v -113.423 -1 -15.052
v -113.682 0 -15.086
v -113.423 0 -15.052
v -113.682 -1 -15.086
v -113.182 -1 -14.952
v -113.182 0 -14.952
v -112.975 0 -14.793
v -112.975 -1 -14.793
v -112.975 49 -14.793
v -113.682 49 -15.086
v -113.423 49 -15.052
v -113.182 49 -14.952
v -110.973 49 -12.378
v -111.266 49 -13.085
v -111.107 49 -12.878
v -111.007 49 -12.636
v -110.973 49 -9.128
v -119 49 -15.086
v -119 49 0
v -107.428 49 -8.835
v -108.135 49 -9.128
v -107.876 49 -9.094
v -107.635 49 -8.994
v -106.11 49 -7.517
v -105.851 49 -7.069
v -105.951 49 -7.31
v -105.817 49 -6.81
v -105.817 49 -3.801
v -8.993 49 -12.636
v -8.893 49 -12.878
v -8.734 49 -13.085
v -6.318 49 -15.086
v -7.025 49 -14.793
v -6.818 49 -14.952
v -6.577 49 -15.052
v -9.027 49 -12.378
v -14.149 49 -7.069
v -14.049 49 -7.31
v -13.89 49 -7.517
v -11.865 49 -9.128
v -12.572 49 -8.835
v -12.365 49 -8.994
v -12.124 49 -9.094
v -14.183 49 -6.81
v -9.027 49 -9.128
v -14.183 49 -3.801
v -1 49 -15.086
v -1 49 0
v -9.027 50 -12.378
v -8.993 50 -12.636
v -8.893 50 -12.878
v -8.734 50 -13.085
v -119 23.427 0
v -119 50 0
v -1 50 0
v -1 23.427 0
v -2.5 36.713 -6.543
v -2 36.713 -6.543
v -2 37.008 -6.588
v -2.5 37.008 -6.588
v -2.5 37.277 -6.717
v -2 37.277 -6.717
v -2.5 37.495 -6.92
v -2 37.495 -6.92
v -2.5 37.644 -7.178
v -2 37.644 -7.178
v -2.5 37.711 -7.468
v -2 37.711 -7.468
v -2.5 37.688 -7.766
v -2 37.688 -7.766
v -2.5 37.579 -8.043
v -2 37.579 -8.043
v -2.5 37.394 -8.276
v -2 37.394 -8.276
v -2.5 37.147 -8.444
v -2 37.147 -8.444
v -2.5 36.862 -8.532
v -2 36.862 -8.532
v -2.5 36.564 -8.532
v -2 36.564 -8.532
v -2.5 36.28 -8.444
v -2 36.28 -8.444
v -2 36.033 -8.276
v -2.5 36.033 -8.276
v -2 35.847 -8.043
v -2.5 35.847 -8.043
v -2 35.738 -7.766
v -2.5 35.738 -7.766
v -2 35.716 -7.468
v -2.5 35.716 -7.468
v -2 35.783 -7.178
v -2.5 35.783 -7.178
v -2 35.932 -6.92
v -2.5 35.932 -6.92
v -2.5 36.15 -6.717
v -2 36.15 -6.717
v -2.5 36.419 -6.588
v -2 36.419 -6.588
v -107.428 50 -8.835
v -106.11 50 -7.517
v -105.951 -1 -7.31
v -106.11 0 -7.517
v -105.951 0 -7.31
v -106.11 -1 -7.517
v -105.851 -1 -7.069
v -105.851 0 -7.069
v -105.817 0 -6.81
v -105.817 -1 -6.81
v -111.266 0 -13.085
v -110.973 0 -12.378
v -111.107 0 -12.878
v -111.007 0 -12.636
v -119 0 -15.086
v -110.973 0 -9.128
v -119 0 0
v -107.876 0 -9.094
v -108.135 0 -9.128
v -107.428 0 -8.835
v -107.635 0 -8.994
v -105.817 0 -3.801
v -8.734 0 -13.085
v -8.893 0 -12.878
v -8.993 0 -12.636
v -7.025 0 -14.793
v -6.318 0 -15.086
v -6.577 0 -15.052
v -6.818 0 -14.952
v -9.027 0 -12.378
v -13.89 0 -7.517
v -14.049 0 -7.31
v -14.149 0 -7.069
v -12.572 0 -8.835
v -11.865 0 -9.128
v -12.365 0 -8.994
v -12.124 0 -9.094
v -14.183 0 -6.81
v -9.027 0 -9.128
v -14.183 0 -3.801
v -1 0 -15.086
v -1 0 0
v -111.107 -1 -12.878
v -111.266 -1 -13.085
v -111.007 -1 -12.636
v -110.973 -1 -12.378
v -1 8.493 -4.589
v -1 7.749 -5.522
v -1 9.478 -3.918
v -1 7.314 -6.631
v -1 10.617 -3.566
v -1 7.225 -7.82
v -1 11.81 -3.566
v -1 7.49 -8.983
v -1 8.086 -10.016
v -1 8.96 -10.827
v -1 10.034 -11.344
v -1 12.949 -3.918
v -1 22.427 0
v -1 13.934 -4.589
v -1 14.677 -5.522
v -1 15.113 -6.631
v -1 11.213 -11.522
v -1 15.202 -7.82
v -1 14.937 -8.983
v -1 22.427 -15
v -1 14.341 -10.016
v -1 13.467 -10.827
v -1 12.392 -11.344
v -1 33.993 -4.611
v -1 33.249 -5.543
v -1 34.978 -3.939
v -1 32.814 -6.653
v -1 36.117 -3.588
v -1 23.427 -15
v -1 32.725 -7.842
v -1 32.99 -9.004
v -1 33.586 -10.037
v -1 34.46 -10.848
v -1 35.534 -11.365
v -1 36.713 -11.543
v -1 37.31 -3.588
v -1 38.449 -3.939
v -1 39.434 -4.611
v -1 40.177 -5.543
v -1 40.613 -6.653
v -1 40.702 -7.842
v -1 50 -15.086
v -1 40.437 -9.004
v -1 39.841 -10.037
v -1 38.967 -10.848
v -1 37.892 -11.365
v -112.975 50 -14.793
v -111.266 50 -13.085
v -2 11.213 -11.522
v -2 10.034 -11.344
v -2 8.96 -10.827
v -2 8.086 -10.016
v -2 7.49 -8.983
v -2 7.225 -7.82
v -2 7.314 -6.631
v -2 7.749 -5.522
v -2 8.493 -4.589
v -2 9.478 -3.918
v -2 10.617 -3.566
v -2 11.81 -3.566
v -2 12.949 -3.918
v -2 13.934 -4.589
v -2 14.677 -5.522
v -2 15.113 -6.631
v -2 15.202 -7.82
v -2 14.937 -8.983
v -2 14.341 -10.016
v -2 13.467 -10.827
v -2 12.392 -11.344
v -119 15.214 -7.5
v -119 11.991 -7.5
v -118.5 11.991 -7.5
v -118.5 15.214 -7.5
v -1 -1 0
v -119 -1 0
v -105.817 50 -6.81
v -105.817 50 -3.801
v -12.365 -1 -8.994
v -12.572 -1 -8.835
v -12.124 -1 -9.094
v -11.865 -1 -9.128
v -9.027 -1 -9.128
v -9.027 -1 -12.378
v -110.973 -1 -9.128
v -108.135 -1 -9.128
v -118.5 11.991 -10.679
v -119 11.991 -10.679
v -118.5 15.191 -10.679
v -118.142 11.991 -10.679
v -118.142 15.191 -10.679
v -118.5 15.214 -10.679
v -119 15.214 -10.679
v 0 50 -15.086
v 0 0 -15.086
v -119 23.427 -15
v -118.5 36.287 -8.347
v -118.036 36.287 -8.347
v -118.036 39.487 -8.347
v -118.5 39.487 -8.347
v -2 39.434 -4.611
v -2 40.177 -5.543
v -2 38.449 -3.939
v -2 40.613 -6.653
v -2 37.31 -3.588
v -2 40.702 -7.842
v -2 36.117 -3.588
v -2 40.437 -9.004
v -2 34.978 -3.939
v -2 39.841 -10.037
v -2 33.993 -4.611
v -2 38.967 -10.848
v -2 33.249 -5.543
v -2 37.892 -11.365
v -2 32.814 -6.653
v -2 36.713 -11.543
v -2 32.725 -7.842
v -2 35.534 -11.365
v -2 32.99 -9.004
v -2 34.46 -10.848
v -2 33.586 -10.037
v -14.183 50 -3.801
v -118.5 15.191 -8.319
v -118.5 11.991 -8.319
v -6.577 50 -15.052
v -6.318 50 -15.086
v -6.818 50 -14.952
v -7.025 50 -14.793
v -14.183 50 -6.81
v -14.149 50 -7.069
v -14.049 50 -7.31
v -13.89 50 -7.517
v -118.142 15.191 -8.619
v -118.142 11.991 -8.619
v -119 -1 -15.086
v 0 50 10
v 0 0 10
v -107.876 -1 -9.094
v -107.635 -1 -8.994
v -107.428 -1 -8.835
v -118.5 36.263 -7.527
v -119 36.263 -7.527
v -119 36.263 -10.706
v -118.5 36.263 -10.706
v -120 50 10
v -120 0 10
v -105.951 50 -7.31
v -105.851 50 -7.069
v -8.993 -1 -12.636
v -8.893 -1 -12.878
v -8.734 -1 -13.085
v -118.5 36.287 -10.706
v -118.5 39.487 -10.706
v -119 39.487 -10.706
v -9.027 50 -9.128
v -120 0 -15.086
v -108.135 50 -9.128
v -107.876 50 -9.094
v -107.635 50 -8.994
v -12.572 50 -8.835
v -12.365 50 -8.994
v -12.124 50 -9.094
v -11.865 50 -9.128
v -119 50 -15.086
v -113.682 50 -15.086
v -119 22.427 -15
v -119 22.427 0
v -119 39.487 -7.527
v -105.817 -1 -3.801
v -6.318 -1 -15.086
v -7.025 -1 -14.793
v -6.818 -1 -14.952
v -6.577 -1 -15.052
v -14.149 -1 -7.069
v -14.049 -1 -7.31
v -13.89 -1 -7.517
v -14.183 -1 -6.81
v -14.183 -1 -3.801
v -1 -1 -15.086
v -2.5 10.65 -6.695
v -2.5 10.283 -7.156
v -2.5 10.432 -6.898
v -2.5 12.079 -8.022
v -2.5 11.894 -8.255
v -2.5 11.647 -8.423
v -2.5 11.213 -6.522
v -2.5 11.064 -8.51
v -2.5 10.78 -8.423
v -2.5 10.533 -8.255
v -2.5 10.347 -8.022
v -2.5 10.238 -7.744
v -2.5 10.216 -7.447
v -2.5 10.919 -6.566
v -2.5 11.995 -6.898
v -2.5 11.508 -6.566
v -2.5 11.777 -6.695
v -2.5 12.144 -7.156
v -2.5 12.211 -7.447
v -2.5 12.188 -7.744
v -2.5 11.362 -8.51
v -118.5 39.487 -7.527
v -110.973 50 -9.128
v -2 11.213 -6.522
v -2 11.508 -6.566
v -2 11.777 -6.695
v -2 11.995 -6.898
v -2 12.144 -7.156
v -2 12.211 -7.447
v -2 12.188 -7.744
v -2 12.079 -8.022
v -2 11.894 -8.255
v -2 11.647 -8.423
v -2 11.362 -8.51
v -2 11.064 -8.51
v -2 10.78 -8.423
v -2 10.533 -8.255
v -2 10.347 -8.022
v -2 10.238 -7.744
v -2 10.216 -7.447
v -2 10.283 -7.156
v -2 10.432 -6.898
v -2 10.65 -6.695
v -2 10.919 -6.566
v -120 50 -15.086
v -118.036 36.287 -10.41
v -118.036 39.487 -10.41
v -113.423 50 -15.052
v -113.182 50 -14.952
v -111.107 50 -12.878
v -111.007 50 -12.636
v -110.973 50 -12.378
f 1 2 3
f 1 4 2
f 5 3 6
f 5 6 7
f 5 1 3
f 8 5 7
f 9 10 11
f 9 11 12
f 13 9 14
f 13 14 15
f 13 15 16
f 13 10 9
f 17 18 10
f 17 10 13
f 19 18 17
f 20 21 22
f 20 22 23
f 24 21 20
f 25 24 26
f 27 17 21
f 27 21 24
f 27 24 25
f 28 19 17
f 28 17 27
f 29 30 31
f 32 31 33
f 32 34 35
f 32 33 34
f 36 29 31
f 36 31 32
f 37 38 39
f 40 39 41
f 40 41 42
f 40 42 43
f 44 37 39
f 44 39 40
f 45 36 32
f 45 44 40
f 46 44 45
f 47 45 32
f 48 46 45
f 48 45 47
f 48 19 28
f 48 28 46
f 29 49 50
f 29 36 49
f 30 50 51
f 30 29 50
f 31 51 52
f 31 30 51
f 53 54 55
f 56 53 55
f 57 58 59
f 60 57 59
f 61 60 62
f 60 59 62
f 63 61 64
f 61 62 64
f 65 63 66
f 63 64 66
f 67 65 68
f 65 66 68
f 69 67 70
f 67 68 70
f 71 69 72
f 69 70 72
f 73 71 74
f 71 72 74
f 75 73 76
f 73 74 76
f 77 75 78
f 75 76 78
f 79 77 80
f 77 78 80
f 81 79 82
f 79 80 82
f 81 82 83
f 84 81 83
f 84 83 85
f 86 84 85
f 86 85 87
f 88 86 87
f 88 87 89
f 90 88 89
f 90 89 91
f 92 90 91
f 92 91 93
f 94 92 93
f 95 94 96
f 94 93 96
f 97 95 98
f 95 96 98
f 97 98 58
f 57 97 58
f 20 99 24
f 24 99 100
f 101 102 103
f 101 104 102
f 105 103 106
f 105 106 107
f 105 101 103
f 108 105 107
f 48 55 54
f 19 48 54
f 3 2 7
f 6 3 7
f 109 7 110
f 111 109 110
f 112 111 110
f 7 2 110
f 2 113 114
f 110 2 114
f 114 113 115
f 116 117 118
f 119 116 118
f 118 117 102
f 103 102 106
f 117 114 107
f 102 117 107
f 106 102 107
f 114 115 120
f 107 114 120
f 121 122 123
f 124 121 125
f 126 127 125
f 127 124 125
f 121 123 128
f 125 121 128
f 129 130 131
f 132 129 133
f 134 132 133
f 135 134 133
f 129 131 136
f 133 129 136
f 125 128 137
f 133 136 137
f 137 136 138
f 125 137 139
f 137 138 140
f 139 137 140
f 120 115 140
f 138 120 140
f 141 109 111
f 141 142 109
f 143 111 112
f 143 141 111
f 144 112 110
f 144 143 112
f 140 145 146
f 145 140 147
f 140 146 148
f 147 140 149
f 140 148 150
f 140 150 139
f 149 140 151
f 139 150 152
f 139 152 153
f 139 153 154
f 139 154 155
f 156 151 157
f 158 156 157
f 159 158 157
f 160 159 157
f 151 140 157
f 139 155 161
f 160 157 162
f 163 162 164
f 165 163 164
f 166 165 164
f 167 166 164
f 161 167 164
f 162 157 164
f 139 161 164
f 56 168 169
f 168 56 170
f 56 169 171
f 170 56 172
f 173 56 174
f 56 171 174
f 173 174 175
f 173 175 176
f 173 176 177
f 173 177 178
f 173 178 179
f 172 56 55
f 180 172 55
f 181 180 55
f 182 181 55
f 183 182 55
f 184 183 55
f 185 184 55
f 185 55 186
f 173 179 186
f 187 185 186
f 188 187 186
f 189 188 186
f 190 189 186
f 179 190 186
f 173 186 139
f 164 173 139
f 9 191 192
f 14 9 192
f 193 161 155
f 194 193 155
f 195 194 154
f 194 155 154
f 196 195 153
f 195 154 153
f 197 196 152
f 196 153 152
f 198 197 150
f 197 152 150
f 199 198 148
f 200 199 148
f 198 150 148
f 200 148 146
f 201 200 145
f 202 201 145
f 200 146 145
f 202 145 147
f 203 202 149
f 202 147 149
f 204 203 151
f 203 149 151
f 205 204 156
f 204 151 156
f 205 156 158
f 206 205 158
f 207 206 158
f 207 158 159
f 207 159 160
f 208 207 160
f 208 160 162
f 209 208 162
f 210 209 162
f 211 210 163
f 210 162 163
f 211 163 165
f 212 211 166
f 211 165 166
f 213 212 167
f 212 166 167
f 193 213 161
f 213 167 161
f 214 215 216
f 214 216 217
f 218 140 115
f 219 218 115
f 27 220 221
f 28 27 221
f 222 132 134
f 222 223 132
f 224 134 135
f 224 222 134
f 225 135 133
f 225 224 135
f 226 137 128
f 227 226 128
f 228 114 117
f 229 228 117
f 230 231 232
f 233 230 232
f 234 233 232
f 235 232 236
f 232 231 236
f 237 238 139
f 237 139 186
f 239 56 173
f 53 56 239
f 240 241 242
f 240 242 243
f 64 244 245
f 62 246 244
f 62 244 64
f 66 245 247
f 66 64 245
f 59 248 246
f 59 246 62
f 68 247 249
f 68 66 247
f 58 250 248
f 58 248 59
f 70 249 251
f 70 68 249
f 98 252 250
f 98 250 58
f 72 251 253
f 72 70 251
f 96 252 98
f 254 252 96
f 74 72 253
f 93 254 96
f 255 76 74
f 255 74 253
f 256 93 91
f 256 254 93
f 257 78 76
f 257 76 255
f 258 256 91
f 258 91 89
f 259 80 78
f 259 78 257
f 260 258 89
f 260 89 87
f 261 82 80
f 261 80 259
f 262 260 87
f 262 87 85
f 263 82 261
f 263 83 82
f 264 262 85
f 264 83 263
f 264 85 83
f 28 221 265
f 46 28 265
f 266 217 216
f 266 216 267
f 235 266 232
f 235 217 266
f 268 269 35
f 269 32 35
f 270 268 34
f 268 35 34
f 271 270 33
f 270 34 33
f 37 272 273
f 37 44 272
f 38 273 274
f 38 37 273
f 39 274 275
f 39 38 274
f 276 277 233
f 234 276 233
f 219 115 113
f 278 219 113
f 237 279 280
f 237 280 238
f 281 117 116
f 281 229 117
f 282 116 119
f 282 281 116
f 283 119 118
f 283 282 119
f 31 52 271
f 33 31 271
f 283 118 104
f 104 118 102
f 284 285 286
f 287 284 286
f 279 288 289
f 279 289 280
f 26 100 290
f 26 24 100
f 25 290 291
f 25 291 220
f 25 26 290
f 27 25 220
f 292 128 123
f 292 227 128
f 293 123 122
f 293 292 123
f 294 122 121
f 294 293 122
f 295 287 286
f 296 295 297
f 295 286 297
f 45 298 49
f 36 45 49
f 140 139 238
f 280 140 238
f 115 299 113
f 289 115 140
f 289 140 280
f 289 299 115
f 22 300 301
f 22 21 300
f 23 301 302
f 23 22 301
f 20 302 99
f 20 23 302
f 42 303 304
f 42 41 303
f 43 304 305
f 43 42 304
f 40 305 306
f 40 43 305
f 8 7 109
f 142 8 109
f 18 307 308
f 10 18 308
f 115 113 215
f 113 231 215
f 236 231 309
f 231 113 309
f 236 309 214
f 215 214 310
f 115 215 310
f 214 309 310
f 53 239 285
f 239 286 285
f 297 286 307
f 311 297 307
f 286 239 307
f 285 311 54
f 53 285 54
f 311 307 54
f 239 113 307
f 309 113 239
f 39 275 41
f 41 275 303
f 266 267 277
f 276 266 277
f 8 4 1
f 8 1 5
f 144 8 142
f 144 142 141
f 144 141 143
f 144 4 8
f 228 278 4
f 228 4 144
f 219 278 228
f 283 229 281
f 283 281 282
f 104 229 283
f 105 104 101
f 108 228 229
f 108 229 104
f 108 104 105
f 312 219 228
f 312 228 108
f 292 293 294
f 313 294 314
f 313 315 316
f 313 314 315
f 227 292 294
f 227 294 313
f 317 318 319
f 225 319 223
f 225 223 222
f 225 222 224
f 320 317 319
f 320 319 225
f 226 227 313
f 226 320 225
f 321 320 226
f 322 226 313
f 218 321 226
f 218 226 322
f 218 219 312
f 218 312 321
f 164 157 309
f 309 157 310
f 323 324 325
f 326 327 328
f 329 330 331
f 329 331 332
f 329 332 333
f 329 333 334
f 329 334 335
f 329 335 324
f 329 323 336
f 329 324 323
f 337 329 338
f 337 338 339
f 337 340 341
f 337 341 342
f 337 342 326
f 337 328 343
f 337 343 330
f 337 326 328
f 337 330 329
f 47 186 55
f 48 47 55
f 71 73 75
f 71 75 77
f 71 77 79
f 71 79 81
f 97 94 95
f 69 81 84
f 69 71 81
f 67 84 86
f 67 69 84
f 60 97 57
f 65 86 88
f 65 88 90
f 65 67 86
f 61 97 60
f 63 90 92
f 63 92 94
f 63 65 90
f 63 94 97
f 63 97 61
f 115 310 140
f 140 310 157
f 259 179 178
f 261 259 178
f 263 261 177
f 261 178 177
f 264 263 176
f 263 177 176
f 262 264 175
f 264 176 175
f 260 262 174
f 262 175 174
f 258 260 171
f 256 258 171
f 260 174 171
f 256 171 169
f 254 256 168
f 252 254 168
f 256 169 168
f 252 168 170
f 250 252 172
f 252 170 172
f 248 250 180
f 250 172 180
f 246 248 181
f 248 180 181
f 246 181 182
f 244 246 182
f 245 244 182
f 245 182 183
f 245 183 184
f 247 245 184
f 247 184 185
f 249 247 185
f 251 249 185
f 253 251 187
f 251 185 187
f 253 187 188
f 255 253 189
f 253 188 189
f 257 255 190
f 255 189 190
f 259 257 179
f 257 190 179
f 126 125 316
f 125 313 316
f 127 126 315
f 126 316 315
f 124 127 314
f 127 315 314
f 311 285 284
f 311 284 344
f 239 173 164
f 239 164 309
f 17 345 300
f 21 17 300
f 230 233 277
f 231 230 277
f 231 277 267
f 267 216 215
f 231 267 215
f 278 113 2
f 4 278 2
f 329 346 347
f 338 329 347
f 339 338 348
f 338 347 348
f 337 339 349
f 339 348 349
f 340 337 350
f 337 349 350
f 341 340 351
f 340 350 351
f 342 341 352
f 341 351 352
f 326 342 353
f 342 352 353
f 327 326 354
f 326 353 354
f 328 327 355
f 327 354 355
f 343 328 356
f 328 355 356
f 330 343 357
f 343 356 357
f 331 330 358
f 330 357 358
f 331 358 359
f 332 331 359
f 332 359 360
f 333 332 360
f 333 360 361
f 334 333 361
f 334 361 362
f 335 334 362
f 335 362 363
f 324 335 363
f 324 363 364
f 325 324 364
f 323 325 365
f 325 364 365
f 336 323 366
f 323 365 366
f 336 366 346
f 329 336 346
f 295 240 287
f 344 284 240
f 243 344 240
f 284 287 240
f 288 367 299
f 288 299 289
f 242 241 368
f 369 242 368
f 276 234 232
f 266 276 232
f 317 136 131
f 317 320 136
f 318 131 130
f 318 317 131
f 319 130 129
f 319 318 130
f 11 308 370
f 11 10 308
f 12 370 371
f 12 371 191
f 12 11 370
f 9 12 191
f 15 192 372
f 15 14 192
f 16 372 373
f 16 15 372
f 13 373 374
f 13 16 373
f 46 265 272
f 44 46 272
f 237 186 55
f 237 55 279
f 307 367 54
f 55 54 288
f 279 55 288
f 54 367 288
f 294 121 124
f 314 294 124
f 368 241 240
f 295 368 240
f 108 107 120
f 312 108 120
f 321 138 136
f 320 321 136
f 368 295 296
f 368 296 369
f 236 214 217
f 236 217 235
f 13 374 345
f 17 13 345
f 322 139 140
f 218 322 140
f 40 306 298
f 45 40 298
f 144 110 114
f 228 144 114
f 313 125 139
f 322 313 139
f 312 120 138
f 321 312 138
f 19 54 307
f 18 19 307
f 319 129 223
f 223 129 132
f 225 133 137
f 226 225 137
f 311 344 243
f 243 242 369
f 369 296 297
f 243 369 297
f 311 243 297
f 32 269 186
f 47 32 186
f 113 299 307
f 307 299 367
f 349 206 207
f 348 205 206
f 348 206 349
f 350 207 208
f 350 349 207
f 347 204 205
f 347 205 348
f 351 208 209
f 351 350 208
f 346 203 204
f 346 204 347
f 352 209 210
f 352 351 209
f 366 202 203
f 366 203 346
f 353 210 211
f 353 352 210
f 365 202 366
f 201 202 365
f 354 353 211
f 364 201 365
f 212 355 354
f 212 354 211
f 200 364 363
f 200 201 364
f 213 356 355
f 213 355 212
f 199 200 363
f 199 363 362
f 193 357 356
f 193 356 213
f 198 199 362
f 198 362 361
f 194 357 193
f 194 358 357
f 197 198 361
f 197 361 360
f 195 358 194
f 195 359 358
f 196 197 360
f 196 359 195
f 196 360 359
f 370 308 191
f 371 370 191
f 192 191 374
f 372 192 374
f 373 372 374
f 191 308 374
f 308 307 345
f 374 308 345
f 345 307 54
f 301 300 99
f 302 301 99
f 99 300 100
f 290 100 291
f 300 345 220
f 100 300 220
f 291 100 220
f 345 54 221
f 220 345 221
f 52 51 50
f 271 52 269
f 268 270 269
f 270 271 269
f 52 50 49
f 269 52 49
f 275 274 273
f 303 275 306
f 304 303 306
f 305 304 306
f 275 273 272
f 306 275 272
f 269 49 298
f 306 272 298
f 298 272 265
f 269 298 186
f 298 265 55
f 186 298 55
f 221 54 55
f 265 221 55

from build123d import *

# Parameters (mm, degrees)
SKETCH2_W            = 120
SKETCH2_H            = 50
BOSS_EXTRUDE1_DEPTH  = 10
SKETCH5_W            = 120
SKETCH5_H            = 1
BOSS_EXTRUDE2_DEPTH  = 15
SKETCH6_W            = 15.086263202
SKETCH6_H            = 50
BOSS_EXTRUDE5_DEPTH  = 1
SKETCH7_W            = 15.086263202
SKETCH7_H            = 50
BOSS_EXTRUDE6_DEPTH  = 1
BOSS_EXTRUDE7_DEPTH  = 1
LPATTERN2_COUNT      = 2
LPATTERN2_PITCH      = 50
FILLET1_R            = 1
FILLET2_R            = 1
SKETCH10_R           = 4
BOSS_EXTRUDE8_DEPTH  = 1
SKETCH11_R           = 4
BOSS_EXTRUDE10_DEPTH = 1
SKETCH12_R           = 1
BOSS_EXTRUDE11_DEPTH = 0.5
SKETCH13_W           = 3.178775998
SKETCH13_H           = 3.223697934
SKETCH13_H_2         = 3.223697935
BOSS_EXTRUDE12_DEPTH = 0.5
BOSS_EXTRUDE13_DEPTH = 3.2
BOSS_EXTRUDE15_DEPTH = 3.2


with BuildPart() as part:
    # Sketch2 → Boss-Extrude1 (new body)
    with BuildSketch(Plane.XY):
        with Locations((-60, 25)):
            Rectangle(SKETCH2_W, SKETCH2_H)
    extrude(amount=BOSS_EXTRUDE1_DEPTH)

    # Sketch5 → Boss-Extrude2 (add)
    with BuildSketch(Plane(origin=(0, 0, 0), x_dir=(-1, 0, 0), z_dir=(0, 0, -1))):
        with Locations((60, 22.926780628)):
            Rectangle(SKETCH5_W, SKETCH5_H)
    extrude(amount=BOSS_EXTRUDE2_DEPTH)

    # Sketch6 → Boss-Extrude5 (add)
    with BuildSketch(Plane(origin=(0, 0, 0), x_dir=(0, 0, -1), z_dir=(1, 0, 0))):
        with Locations((7.543131601, 25)):
            Rectangle(SKETCH6_W, SKETCH6_H)
    extrude(amount=-BOSS_EXTRUDE5_DEPTH)

    # Sketch7 → Boss-Extrude6 (add)
    with BuildSketch(Plane.ZY.offset(120)):
        with Locations((-7.543131601, 25)):
            Rectangle(SKETCH7_W, SKETCH7_H)
    extrude(amount=-BOSS_EXTRUDE6_DEPTH)

    # Sketch10 → Boss-Extrude8 (add)
    with BuildSketch(Plane.ZY.offset(1)):
        with Locations(Location((-7.543131601, 36.713390314, 0), (0, 0, 180))):
            Circle(SKETCH10_R)
    extrude(amount=BOSS_EXTRUDE8_DEPTH)

    # Sketch11 → Boss-Extrude10 (add)
    with BuildSketch(Plane.ZY.offset(1)):
        with Locations(Location((-7.5215658, 11.213390314, 0), (0, 0, 180))):
            Circle(SKETCH11_R)
    extrude(amount=BOSS_EXTRUDE10_DEPTH)

    # Sketch12 → Boss-Extrude11 (add)
    with BuildSketch(Plane.ZY.offset(2)):
        with Locations((-7.543131601, 36.713390314)):
            Circle(SKETCH12_R)
        with Locations((-7.5215658, 11.213390314)):
            Circle(SKETCH12_R)
    extrude(amount=BOSS_EXTRUDE11_DEPTH)

    # Sketch13 → Boss-Extrude12 (add)
    with BuildSketch(Plane(origin=(-119, 0, 0), x_dir=(0, 0, -1), z_dir=(1, 0, 0))):
        with Locations((9.116474982, 37.875113353)):
            Rectangle(SKETCH13_W, SKETCH13_H)
        with Locations((9.089387999, 13.602585939)):
            Rectangle(SKETCH13_W, SKETCH13_H_2)
    extrude(amount=BOSS_EXTRUDE12_DEPTH)

    # Sketch14 → Boss-Extrude13 (add)
    with BuildSketch(Plane(origin=(0, 39.48696232, 0), x_dir=(1, 0, 0), z_dir=(0, 1, 0))):
        Polygon((-118.5, 10.705862981), (-118.03582127, 10.40955065), (-118.03582127, 9.44156523), (-118.03582127, 8.346630902), (-118.5, 8.346630902), align=None)
    extrude(amount=-BOSS_EXTRUDE13_DEPTH)

    # Sketch15 → Boss-Extrude15 (add)
    with BuildSketch(Plane.XZ.offset(-11.990736971)):
        Polygon((-118.5, -10.678775998), (-118.5, -8.318775998), (-118.142191313, -8.618775998), (-118.142191313, -10.678775998), align=None)
    extrude(amount=-BOSS_EXTRUDE15_DEPTH)


with BuildPart() as body_2:
    # Sketch9 → Boss-Extrude7 (new body)
    with BuildSketch(Plane.XZ):
        Polygon((-6.732051107, -15.086263202), (-1, -15.086263202), (-1, 0), (-14.183064322, 0), (-60, 0), (-60, -3.801343331), (-14.183064322, -3.801343331), (-14.183064322, -7.224562619), (-12.279477372, -9.12814957), (-9.026587083, -9.12814957), (-9.026587083, -12.791727226), align=None)
        Polygon((-60, -3.801343331), (-60, 0), (-105.816935678, 0), (-119, 0), (-119, -15.086263202), (-113.267948893, -15.086263202), (-110.973412917, -12.791727226), (-110.973412917, -9.12814957), (-107.720522628, -9.12814957), (-105.816935678, -7.224562619), (-105.816935678, -3.801343331), align=None)
    boss_extrude7 = extrude(amount=BOSS_EXTRUDE7_DEPTH)

    # Fillet2
    fillet2_edges = [body_2.edges().sort_by_distance(p)[0] for p in [
        (-105.816935678, -0.5, -7.224562619),
        (-107.720522628, -0.5, -9.12814957),
        (-110.973412917, -0.5, -12.791727226),
        (-113.267948893, -0.5, -15.086263202),
        (-6.732051107, -0.5, -15.086263202),
        (-9.026587083, -0.5, -12.791727226),
        (-12.279477372, -0.5, -9.12814957),
        (-14.183064322, -0.5, -7.224562619),
    ]]
    fillet(fillet2_edges, radius=FILLET2_R)


with BuildPart() as lpattern2_1:
    # LPattern2: Boss-Extrude7 ×2
    with Locations(*[(0, i * LPATTERN2_PITCH, 0) for i in range(1, LPATTERN2_COUNT)]):
        add(boss_extrude7)

    # Fillet1
    fillet1_edges = [lpattern2_1.edges().sort_by_distance(p)[0] for p in [
        (-105.816935678, 49.5, -7.224562619),
        (-107.720522628, 49.5, -9.12814957),
        (-110.973412917, 49.5, -12.791727226),
        (-113.267948893, 49.5, -15.086263202),
        (-6.732051107, 49.5, -15.086263202),
        (-9.026587083, 49.5, -12.791727226),
        (-12.279477372, 49.5, -9.12814957),
        (-14.183064322, 49.5, -7.224562619),
    ]]
    fillet(fillet1_edges, radius=FILLET1_R)


solid = Compound([part.part, body_2.part, lpattern2_1.part])
